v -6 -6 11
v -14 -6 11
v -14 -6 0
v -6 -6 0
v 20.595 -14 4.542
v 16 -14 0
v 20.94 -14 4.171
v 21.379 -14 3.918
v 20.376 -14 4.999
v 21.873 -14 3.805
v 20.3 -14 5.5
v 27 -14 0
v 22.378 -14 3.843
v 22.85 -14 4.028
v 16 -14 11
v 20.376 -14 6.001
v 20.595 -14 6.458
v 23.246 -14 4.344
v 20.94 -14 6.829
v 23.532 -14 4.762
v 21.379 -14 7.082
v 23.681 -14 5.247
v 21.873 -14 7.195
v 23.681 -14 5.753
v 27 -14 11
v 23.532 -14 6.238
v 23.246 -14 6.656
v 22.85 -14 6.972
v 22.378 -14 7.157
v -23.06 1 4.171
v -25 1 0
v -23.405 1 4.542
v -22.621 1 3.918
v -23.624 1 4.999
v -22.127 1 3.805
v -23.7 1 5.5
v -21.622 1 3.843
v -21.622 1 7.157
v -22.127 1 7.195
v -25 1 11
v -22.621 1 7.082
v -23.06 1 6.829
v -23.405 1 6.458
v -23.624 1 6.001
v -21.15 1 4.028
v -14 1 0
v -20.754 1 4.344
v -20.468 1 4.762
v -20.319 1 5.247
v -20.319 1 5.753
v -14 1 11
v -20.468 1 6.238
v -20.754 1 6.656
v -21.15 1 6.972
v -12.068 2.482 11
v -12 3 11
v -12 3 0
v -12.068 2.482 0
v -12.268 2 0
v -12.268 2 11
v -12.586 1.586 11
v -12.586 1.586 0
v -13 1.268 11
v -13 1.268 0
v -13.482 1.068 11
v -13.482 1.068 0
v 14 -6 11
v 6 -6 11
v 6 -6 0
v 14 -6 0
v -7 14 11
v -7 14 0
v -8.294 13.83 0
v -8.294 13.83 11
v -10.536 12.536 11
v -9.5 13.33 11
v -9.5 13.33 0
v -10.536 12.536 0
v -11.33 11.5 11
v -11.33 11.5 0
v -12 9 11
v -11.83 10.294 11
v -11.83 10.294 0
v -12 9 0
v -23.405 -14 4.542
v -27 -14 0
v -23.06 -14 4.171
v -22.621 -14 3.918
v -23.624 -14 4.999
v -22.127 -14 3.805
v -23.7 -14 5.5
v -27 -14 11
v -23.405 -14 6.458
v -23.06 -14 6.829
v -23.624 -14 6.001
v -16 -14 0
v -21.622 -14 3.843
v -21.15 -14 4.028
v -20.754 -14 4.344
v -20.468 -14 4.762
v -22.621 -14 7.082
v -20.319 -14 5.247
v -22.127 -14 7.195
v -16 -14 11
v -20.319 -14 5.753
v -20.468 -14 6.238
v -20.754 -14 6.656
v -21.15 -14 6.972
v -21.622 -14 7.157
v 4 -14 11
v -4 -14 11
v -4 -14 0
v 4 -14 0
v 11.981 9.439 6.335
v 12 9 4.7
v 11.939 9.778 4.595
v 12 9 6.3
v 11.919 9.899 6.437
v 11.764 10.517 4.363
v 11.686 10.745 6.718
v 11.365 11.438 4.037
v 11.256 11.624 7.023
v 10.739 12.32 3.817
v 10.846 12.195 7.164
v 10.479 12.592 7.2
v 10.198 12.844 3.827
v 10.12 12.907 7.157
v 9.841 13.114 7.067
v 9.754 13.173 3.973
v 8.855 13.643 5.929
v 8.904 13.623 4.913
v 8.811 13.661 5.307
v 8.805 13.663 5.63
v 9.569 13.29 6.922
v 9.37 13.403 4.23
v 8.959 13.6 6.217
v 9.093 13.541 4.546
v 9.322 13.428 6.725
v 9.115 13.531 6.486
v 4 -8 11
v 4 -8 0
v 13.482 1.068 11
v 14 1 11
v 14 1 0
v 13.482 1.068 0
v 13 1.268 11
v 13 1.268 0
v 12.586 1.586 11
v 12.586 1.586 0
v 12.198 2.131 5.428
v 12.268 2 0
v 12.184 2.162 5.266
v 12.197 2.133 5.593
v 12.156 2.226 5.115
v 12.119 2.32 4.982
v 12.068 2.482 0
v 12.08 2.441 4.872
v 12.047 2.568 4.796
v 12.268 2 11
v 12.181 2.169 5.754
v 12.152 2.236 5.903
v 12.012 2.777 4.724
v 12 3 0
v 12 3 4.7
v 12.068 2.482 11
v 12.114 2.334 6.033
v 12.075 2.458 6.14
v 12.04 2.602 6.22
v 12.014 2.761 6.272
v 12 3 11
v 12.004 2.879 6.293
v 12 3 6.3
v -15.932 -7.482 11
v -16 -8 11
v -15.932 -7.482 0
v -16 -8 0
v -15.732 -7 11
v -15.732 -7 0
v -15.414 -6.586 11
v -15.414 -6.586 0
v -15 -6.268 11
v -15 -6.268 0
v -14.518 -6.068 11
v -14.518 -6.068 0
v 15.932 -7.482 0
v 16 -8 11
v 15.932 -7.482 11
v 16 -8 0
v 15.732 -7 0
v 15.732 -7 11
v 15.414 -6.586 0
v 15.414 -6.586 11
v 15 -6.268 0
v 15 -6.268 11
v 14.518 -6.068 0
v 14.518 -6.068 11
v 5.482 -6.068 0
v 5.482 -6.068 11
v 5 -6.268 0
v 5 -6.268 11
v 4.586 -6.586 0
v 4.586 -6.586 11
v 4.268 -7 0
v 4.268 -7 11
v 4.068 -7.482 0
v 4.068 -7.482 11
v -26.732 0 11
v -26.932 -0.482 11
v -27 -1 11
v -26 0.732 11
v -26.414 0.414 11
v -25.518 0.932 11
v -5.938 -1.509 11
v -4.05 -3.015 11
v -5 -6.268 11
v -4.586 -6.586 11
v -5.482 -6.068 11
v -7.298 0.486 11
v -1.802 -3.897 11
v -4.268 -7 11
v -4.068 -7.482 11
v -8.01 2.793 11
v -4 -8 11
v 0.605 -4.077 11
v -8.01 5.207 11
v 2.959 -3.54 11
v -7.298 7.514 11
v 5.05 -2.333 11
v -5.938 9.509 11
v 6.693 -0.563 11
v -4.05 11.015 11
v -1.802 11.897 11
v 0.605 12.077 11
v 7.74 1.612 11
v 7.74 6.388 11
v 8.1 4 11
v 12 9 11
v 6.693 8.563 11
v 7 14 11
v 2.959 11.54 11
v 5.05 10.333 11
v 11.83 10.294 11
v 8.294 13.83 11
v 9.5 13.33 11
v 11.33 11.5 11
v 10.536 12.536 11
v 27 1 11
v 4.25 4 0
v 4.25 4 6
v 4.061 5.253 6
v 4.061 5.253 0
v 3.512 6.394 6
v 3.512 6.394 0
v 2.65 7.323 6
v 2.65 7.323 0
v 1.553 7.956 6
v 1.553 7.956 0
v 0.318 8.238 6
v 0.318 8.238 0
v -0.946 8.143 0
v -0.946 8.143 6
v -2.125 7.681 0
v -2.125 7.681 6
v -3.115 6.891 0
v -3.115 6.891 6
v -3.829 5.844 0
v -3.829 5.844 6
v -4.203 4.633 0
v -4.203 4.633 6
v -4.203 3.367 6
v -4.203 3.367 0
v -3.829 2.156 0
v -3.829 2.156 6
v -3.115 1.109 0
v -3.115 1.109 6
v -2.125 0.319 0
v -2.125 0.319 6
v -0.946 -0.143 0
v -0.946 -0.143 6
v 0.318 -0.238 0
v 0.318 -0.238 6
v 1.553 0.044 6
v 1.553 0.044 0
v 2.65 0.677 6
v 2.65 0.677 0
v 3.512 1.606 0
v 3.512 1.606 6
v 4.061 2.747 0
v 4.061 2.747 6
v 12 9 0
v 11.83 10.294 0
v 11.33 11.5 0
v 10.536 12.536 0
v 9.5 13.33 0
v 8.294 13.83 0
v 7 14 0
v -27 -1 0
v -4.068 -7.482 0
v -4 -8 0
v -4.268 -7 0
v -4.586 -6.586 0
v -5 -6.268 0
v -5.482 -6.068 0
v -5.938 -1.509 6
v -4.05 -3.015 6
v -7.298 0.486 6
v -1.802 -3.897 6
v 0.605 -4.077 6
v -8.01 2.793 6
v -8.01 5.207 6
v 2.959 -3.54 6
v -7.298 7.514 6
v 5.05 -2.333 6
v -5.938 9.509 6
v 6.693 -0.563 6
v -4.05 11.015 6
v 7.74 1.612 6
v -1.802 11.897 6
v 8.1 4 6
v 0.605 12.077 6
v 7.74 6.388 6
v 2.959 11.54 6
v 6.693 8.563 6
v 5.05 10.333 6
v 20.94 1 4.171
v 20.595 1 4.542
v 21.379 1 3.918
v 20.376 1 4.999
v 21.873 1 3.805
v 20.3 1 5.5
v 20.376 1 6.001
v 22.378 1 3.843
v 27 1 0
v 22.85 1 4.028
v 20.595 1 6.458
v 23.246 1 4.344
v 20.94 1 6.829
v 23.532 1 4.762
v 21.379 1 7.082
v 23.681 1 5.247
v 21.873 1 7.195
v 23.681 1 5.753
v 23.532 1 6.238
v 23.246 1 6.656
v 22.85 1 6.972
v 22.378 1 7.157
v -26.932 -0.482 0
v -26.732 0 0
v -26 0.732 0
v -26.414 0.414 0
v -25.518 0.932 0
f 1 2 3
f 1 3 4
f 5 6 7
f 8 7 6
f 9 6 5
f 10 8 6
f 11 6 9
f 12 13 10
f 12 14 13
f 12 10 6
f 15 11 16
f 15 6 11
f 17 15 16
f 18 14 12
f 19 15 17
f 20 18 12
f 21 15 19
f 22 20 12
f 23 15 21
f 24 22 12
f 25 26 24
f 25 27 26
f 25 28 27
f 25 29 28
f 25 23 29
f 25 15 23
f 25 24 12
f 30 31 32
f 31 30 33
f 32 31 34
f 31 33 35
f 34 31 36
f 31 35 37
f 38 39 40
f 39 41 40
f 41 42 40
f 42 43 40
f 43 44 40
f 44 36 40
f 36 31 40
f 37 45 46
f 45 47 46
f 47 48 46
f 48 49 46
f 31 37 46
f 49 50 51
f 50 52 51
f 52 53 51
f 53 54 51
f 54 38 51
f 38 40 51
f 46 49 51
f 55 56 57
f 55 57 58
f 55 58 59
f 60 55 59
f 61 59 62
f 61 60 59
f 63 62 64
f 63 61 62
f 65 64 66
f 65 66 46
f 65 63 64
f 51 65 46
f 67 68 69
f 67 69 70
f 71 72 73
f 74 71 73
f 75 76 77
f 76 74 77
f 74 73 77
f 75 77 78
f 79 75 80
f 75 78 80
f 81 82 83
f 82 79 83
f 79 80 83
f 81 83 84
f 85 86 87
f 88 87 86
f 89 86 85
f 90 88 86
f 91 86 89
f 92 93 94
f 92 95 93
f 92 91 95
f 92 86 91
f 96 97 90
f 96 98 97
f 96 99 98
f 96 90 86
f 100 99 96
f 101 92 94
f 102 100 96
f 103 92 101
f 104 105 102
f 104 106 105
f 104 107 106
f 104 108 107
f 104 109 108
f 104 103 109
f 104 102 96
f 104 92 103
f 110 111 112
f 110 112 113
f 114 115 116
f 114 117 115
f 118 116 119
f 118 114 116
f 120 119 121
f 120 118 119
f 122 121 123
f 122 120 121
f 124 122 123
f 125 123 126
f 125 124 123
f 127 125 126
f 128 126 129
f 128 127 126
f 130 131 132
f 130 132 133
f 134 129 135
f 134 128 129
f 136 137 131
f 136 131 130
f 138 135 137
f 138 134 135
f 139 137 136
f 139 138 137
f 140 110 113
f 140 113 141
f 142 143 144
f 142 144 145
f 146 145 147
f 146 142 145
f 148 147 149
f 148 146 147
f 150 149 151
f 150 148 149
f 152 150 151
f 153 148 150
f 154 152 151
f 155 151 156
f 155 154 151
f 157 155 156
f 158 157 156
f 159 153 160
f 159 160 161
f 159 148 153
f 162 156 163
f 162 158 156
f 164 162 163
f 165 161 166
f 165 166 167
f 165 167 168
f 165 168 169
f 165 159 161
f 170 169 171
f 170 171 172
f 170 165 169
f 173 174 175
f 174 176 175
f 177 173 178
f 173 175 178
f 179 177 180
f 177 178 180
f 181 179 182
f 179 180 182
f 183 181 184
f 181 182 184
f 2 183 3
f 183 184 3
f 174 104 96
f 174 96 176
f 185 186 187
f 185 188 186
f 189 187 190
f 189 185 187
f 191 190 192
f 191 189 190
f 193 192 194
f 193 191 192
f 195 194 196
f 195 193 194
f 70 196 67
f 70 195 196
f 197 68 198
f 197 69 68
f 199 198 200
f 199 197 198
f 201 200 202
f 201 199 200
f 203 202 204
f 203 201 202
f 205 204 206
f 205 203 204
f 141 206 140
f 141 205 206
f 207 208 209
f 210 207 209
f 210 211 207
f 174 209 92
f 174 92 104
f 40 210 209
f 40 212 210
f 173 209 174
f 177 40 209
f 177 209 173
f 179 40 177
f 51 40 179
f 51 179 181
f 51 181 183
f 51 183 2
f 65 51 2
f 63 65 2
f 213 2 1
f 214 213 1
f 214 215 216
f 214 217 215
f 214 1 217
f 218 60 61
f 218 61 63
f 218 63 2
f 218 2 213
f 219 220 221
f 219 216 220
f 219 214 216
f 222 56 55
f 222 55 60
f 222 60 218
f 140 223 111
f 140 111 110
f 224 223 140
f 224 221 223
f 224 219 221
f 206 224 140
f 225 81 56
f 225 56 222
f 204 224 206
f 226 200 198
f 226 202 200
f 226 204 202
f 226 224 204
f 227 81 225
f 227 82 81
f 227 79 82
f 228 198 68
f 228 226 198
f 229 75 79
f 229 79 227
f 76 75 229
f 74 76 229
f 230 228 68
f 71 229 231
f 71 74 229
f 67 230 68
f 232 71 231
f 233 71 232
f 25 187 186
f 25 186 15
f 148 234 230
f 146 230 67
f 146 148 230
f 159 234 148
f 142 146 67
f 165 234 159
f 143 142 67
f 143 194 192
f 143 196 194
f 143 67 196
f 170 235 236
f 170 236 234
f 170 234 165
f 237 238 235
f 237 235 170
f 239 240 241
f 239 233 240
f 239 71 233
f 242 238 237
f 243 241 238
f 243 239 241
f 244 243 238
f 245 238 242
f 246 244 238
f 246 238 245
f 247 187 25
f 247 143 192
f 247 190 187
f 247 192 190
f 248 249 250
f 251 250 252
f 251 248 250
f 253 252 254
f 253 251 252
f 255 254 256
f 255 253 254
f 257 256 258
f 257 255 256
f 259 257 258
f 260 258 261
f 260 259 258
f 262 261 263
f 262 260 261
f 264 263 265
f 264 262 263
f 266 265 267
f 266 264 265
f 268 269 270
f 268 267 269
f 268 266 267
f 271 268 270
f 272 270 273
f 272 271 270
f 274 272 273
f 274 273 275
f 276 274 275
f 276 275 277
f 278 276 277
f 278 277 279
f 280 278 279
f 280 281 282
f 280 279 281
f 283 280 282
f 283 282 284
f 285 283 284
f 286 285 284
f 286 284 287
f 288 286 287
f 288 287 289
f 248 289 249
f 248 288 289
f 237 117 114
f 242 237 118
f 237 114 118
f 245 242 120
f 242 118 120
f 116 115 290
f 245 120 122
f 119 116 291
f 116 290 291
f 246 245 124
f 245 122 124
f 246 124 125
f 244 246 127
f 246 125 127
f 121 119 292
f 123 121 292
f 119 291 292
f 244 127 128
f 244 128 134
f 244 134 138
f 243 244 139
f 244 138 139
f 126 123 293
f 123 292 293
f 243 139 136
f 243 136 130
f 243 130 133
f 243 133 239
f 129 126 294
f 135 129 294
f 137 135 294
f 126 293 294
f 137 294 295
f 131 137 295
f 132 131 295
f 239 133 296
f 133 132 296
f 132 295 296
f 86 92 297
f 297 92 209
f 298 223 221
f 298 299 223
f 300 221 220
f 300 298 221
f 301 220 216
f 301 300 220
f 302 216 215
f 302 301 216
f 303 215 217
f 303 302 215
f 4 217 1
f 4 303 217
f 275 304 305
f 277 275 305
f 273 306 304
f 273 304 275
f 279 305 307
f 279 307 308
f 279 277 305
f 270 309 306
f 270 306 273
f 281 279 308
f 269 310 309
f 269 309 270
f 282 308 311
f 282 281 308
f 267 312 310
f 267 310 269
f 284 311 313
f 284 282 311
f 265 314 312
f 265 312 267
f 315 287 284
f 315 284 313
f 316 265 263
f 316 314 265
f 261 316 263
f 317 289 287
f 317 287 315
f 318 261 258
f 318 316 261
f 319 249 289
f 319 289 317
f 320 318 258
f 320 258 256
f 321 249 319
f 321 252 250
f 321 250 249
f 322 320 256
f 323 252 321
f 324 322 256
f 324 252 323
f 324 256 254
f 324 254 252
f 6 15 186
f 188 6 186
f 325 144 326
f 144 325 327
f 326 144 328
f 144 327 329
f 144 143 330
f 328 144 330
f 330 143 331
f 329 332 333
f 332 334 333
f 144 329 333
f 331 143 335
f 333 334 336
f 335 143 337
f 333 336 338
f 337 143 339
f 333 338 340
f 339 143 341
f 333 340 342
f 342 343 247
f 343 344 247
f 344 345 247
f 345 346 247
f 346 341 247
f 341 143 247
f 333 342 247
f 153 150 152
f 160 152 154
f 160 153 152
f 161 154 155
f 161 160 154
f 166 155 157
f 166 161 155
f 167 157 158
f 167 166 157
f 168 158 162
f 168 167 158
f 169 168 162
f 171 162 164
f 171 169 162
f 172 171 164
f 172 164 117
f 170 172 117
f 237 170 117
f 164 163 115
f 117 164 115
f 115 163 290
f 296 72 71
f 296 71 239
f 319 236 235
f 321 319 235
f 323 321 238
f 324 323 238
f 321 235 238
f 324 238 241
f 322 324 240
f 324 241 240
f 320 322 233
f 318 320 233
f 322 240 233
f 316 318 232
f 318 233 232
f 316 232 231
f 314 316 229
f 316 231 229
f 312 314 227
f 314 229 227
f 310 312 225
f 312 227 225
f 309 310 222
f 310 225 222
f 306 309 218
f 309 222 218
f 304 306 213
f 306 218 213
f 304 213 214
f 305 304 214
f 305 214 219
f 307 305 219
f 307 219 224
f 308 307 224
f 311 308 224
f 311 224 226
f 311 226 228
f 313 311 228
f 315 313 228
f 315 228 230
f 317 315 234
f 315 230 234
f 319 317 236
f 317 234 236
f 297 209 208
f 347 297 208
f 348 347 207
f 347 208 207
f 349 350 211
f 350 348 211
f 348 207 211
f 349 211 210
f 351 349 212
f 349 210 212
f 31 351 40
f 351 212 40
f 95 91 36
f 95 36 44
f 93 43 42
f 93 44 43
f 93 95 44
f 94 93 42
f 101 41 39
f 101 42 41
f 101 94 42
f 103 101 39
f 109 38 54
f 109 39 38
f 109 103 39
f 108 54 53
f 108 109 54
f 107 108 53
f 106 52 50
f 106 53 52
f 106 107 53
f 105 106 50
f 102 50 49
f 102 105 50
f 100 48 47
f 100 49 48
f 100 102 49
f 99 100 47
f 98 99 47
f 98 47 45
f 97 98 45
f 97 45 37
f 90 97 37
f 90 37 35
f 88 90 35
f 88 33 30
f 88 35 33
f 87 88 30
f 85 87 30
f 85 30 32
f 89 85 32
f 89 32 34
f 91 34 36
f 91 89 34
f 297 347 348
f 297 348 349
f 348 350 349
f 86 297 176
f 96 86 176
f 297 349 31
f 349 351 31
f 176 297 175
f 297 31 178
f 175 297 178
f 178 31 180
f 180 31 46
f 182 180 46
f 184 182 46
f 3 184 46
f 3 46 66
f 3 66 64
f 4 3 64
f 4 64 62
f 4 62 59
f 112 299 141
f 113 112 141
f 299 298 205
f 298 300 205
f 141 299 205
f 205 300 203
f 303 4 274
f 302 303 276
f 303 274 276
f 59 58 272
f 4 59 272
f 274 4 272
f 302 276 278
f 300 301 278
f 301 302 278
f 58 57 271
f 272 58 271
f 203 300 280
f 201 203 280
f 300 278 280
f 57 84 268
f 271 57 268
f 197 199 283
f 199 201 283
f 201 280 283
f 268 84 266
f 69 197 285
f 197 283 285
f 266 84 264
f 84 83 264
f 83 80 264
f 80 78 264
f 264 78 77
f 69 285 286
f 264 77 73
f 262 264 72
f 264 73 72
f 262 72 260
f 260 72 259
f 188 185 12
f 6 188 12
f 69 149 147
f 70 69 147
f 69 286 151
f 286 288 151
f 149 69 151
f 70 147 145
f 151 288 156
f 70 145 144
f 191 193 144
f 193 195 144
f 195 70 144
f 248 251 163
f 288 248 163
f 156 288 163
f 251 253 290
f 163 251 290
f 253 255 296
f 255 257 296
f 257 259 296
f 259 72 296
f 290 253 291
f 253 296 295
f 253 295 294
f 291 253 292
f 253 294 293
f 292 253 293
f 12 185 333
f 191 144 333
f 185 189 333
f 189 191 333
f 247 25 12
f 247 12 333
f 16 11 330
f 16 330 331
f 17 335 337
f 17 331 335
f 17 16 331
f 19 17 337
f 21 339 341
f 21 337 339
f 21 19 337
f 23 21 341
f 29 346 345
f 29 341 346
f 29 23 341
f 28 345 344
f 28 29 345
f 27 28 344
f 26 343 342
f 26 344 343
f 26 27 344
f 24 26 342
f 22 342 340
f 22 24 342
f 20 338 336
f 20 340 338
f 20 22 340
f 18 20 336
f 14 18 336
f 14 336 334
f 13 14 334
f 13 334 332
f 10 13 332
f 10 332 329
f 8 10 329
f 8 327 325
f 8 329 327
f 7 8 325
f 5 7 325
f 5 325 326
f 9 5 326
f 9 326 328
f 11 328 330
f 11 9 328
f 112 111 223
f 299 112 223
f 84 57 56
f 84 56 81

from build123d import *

# Parameters (mm, degrees)
SKETCH_1_W               = 24
SKETCH_1_H               = 28
SKETCH_1_R               = 4.25
EXTRUDE_1_DEPTH          = 11
SKETCH_2_R               = 8.1
CUT_EXTRUDE_1_DEPTH      = 5
SKETCH_6_W               = 15
SKETCH_6_H               = 15
EXTRUDE_2_DEPTH          = 11
CUT_EXTRUDE_3_DEPTH      = 33.787192622
CUT_EXTRUDE_3_DEPTH_BACK = 33.787192622
SKETCH_7_R               = 1.7
SKETCH_8_W               = 12
SKETCH_8_H               = 8
CUT_EXTRUDE_4_DEPTH      = 33.341923258
FILLET_1_R               = 2
FILLET_2_R               = 2
FILLET_3_R               = 5
SKETCH_9_R               = 1.7
EXTRUDE_3_DEPTH          = 25
CUT_EXTRUDE_5_DEPTH      = 25


with BuildPart() as part:
    # 草图1 → 凸台-拉伸1 (new body)
    with BuildSketch(Plane.XY):
        Rectangle(SKETCH_1_W, SKETCH_1_H)
        with Locations((0, 4)):
            Circle(SKETCH_1_R, mode=Mode.SUBTRACT)
    extrude(amount=EXTRUDE_1_DEPTH)

    # 草图2 → 切除-拉伸1 (cut)
    with BuildSketch(Plane.XY.offset(11)):
        with Locations((0, 4)):
            Circle(SKETCH_2_R)
    extrude(amount=-CUT_EXTRUDE_1_DEPTH, mode=Mode.SUBTRACT)

    # 草图6 → 凸台-拉伸2 (add)
    with BuildSketch(Plane.XY.offset(11)):
        with Locations((-19.5, -6.5)):
            Rectangle(SKETCH_6_W, SKETCH_6_H)
        with Locations((19.5, -6.5)):
            Rectangle(SKETCH_6_W, SKETCH_6_H)
    extrude(amount=-EXTRUDE_2_DEPTH)

    # 草图7 → 切除-拉伸3 (cut, two sides: drawn at the far end of the back side and taken through both)
    with BuildSketch(Plane(origin=(0, 1, 0), x_dir=(1, 0, 0), z_dir=(0, 1, 0)).offset(-CUT_EXTRUDE_3_DEPTH_BACK)):
        with Locations(Location((22, -5.5, 0), (0, 0, 180))):
            Circle(SKETCH_7_R)
        with Locations(Location((-22, -5.5, 0), (0, 0, 180))):
            Circle(SKETCH_7_R)
        with Locations(Location((10.5, -5.5, 0), (0, 0, 180))):
            Circle(SKETCH_7_R)
    extrude(amount=CUT_EXTRUDE_3_DEPTH + CUT_EXTRUDE_3_DEPTH_BACK, mode=Mode.SUBTRACT)

    # 草图8 → 切除-拉伸4 (cut, through all)
    with BuildSketch(Plane.XY.offset(11)):
        with Locations((-10, -10)):
            Rectangle(SKETCH_8_W, SKETCH_8_H)
        with Locations((10, -10)):
            Rectangle(SKETCH_8_W, SKETCH_8_H)
    extrude(amount=-CUT_EXTRUDE_4_DEPTH, mode=Mode.SUBTRACT)

    # 圆角1
    fillet_1_edges = [part.edges().sort_by_distance(p)[0] for p in [
        (-16, -6, 5.5),
        (-4, -6, 5.5),
        (4, -6, 5.5),
        (16, -6, 5.5),
    ]]
    fillet(fillet_1_edges, radius=FILLET_1_R)

    # 圆角2
    # the kernel refuses this fillet: 2 mm, written as the material it adds along each edge
    with BuildSketch(Plane(origin=(12, 1, 11), x_dir=(1, 0, 0), z_dir=(0, 0, -1))) as fillet_2_piece_1_section:
        with BuildLine():
            CenterArc((FILLET_2_R, -FILLET_2_R), FILLET_2_R, 90, 90)
            Line((0, -FILLET_2_R), (0, 0))
            Line((0, 0), (FILLET_2_R, 0))
        make_face()
    fillet_2_piece_1 = extrude(amount=9.7, mode=Mode.PRIVATE)
    fillet_2_piece_1 = fillet_2_piece_1 - Plane(origin=(10.5, 1.435440369, 5.5), x_dir=(-1, 0, 0), z_dir=(0, -1, 0)) * Cylinder(1.7, 28, mode=Mode.PRIVATE)
    add(fillet_2_piece_1)
    with BuildSketch(Plane(origin=(12, 1, 9.7), x_dir=(0, 1, 0), z_dir=(0, 0, -1))) as fillet_2_piece_2_section:
        with BuildLine():
            CenterArc((FILLET_2_R, FILLET_2_R), FILLET_2_R, 180, 90)
            Line((0, FILLET_2_R), (0, 0))
            Line((0, 0), (FILLET_2_R, 0))
        make_face()
    fillet_2_piece_2 = extrude(amount=9.7, mode=Mode.PRIVATE)
    fillet_2_piece_2 = fillet_2_piece_2 - Plane(origin=(10.5, 1.435440365, 5.5), x_dir=(-1, 0, 0), z_dir=(0, -1, 0)) * Cylinder(1.7, 28, mode=Mode.PRIVATE)
    add(fillet_2_piece_2)
    with BuildSketch(Plane(origin=(-12, 1, 11), x_dir=(-1, 0, 0), z_dir=(0, 0, -1))) as fillet_2_piece_3:
        with BuildLine():
            CenterArc((FILLET_2_R, FILLET_2_R), FILLET_2_R, 180, 90)
            Line((0, FILLET_2_R), (0, 0))
            Line((0, 0), (FILLET_2_R, 0))
        make_face()
    extrude(amount=11)
    # the kernel refuses this fillet: 2 mm, written as the material it takes off along each edge
    with BuildSketch(Plane(origin=(-27, 1, 16), x_dir=(0, -1, 0), z_dir=(0, 0, -1))) as fillet_2_2_piece_1:
        with BuildLine():
            CenterArc((FILLET_2_R, -FILLET_2_R), FILLET_2_R, 90, 90)
            Line((0, -FILLET_2_R), (0, 0))
            Line((0, 0), (FILLET_2_R, 0))
        make_face()
    extrude(amount=21, mode=Mode.SUBTRACT)

    # 圆角3
    # the kernel refuses this fillet: 5 mm, written as the material it takes off along each edge
    with BuildSketch(Plane(origin=(12, 14, -6.2), x_dir=(-1, 0, 0), z_dir=(0, 0, 1))) as fillet_3_piece_1:
        with BuildLine():
            CenterArc((FILLET_3_R, FILLET_3_R), FILLET_3_R, 180, 90)
            Line((0, FILLET_3_R), (0, 0))
            Line((0, 0), (FILLET_3_R, 0))
        make_face()
    extrude(amount=29.7, mode=Mode.SUBTRACT)
    with BuildSketch(Plane(origin=(-12, 14, -12.5), x_dir=(0, -1, 0), z_dir=(0, 0, 1))) as fillet_3_piece_2:
        with BuildLine():
            CenterArc((FILLET_3_R, FILLET_3_R), FILLET_3_R, 180, 90)
            Line((0, FILLET_3_R), (0, 0))
            Line((0, 0), (FILLET_3_R, 0))
        make_face()
    extrude(amount=36, mode=Mode.SUBTRACT)

    # 草图9 → 凸台-拉伸3 (add)
    with BuildSketch(Plane.XZ.offset(6)):
        with Locations((10.5, 5.5)):
            Circle(SKETCH_9_R)
    extrude(amount=-EXTRUDE_3_DEPTH)

    # 草图10 → 切除-拉伸5 (cut)
    with BuildSketch(Plane.XY.offset(11)):
        with BuildLine():
            Line((12, 3), (12, 9))
            ThreePointArc((12, 9), (10.535533906, 12.535533906), (7, 14))
            Line((7, 14), (7.594175957, 21.794622096))
            Line((7.594175957, 21.794622096), (15.452945432, 21.794622096))
            Line((15.452945432, 21.794622096), (16.462328667, 6.870169973))
            Line((16.462328667, 6.870169973), (14, 1))
            ThreePointArc((14, 1), (12.585786438, 1.585786438), (12, 3))
        make_face()
    extrude(amount=-CUT_EXTRUDE_5_DEPTH, mode=Mode.SUBTRACT)


solid = part.part
